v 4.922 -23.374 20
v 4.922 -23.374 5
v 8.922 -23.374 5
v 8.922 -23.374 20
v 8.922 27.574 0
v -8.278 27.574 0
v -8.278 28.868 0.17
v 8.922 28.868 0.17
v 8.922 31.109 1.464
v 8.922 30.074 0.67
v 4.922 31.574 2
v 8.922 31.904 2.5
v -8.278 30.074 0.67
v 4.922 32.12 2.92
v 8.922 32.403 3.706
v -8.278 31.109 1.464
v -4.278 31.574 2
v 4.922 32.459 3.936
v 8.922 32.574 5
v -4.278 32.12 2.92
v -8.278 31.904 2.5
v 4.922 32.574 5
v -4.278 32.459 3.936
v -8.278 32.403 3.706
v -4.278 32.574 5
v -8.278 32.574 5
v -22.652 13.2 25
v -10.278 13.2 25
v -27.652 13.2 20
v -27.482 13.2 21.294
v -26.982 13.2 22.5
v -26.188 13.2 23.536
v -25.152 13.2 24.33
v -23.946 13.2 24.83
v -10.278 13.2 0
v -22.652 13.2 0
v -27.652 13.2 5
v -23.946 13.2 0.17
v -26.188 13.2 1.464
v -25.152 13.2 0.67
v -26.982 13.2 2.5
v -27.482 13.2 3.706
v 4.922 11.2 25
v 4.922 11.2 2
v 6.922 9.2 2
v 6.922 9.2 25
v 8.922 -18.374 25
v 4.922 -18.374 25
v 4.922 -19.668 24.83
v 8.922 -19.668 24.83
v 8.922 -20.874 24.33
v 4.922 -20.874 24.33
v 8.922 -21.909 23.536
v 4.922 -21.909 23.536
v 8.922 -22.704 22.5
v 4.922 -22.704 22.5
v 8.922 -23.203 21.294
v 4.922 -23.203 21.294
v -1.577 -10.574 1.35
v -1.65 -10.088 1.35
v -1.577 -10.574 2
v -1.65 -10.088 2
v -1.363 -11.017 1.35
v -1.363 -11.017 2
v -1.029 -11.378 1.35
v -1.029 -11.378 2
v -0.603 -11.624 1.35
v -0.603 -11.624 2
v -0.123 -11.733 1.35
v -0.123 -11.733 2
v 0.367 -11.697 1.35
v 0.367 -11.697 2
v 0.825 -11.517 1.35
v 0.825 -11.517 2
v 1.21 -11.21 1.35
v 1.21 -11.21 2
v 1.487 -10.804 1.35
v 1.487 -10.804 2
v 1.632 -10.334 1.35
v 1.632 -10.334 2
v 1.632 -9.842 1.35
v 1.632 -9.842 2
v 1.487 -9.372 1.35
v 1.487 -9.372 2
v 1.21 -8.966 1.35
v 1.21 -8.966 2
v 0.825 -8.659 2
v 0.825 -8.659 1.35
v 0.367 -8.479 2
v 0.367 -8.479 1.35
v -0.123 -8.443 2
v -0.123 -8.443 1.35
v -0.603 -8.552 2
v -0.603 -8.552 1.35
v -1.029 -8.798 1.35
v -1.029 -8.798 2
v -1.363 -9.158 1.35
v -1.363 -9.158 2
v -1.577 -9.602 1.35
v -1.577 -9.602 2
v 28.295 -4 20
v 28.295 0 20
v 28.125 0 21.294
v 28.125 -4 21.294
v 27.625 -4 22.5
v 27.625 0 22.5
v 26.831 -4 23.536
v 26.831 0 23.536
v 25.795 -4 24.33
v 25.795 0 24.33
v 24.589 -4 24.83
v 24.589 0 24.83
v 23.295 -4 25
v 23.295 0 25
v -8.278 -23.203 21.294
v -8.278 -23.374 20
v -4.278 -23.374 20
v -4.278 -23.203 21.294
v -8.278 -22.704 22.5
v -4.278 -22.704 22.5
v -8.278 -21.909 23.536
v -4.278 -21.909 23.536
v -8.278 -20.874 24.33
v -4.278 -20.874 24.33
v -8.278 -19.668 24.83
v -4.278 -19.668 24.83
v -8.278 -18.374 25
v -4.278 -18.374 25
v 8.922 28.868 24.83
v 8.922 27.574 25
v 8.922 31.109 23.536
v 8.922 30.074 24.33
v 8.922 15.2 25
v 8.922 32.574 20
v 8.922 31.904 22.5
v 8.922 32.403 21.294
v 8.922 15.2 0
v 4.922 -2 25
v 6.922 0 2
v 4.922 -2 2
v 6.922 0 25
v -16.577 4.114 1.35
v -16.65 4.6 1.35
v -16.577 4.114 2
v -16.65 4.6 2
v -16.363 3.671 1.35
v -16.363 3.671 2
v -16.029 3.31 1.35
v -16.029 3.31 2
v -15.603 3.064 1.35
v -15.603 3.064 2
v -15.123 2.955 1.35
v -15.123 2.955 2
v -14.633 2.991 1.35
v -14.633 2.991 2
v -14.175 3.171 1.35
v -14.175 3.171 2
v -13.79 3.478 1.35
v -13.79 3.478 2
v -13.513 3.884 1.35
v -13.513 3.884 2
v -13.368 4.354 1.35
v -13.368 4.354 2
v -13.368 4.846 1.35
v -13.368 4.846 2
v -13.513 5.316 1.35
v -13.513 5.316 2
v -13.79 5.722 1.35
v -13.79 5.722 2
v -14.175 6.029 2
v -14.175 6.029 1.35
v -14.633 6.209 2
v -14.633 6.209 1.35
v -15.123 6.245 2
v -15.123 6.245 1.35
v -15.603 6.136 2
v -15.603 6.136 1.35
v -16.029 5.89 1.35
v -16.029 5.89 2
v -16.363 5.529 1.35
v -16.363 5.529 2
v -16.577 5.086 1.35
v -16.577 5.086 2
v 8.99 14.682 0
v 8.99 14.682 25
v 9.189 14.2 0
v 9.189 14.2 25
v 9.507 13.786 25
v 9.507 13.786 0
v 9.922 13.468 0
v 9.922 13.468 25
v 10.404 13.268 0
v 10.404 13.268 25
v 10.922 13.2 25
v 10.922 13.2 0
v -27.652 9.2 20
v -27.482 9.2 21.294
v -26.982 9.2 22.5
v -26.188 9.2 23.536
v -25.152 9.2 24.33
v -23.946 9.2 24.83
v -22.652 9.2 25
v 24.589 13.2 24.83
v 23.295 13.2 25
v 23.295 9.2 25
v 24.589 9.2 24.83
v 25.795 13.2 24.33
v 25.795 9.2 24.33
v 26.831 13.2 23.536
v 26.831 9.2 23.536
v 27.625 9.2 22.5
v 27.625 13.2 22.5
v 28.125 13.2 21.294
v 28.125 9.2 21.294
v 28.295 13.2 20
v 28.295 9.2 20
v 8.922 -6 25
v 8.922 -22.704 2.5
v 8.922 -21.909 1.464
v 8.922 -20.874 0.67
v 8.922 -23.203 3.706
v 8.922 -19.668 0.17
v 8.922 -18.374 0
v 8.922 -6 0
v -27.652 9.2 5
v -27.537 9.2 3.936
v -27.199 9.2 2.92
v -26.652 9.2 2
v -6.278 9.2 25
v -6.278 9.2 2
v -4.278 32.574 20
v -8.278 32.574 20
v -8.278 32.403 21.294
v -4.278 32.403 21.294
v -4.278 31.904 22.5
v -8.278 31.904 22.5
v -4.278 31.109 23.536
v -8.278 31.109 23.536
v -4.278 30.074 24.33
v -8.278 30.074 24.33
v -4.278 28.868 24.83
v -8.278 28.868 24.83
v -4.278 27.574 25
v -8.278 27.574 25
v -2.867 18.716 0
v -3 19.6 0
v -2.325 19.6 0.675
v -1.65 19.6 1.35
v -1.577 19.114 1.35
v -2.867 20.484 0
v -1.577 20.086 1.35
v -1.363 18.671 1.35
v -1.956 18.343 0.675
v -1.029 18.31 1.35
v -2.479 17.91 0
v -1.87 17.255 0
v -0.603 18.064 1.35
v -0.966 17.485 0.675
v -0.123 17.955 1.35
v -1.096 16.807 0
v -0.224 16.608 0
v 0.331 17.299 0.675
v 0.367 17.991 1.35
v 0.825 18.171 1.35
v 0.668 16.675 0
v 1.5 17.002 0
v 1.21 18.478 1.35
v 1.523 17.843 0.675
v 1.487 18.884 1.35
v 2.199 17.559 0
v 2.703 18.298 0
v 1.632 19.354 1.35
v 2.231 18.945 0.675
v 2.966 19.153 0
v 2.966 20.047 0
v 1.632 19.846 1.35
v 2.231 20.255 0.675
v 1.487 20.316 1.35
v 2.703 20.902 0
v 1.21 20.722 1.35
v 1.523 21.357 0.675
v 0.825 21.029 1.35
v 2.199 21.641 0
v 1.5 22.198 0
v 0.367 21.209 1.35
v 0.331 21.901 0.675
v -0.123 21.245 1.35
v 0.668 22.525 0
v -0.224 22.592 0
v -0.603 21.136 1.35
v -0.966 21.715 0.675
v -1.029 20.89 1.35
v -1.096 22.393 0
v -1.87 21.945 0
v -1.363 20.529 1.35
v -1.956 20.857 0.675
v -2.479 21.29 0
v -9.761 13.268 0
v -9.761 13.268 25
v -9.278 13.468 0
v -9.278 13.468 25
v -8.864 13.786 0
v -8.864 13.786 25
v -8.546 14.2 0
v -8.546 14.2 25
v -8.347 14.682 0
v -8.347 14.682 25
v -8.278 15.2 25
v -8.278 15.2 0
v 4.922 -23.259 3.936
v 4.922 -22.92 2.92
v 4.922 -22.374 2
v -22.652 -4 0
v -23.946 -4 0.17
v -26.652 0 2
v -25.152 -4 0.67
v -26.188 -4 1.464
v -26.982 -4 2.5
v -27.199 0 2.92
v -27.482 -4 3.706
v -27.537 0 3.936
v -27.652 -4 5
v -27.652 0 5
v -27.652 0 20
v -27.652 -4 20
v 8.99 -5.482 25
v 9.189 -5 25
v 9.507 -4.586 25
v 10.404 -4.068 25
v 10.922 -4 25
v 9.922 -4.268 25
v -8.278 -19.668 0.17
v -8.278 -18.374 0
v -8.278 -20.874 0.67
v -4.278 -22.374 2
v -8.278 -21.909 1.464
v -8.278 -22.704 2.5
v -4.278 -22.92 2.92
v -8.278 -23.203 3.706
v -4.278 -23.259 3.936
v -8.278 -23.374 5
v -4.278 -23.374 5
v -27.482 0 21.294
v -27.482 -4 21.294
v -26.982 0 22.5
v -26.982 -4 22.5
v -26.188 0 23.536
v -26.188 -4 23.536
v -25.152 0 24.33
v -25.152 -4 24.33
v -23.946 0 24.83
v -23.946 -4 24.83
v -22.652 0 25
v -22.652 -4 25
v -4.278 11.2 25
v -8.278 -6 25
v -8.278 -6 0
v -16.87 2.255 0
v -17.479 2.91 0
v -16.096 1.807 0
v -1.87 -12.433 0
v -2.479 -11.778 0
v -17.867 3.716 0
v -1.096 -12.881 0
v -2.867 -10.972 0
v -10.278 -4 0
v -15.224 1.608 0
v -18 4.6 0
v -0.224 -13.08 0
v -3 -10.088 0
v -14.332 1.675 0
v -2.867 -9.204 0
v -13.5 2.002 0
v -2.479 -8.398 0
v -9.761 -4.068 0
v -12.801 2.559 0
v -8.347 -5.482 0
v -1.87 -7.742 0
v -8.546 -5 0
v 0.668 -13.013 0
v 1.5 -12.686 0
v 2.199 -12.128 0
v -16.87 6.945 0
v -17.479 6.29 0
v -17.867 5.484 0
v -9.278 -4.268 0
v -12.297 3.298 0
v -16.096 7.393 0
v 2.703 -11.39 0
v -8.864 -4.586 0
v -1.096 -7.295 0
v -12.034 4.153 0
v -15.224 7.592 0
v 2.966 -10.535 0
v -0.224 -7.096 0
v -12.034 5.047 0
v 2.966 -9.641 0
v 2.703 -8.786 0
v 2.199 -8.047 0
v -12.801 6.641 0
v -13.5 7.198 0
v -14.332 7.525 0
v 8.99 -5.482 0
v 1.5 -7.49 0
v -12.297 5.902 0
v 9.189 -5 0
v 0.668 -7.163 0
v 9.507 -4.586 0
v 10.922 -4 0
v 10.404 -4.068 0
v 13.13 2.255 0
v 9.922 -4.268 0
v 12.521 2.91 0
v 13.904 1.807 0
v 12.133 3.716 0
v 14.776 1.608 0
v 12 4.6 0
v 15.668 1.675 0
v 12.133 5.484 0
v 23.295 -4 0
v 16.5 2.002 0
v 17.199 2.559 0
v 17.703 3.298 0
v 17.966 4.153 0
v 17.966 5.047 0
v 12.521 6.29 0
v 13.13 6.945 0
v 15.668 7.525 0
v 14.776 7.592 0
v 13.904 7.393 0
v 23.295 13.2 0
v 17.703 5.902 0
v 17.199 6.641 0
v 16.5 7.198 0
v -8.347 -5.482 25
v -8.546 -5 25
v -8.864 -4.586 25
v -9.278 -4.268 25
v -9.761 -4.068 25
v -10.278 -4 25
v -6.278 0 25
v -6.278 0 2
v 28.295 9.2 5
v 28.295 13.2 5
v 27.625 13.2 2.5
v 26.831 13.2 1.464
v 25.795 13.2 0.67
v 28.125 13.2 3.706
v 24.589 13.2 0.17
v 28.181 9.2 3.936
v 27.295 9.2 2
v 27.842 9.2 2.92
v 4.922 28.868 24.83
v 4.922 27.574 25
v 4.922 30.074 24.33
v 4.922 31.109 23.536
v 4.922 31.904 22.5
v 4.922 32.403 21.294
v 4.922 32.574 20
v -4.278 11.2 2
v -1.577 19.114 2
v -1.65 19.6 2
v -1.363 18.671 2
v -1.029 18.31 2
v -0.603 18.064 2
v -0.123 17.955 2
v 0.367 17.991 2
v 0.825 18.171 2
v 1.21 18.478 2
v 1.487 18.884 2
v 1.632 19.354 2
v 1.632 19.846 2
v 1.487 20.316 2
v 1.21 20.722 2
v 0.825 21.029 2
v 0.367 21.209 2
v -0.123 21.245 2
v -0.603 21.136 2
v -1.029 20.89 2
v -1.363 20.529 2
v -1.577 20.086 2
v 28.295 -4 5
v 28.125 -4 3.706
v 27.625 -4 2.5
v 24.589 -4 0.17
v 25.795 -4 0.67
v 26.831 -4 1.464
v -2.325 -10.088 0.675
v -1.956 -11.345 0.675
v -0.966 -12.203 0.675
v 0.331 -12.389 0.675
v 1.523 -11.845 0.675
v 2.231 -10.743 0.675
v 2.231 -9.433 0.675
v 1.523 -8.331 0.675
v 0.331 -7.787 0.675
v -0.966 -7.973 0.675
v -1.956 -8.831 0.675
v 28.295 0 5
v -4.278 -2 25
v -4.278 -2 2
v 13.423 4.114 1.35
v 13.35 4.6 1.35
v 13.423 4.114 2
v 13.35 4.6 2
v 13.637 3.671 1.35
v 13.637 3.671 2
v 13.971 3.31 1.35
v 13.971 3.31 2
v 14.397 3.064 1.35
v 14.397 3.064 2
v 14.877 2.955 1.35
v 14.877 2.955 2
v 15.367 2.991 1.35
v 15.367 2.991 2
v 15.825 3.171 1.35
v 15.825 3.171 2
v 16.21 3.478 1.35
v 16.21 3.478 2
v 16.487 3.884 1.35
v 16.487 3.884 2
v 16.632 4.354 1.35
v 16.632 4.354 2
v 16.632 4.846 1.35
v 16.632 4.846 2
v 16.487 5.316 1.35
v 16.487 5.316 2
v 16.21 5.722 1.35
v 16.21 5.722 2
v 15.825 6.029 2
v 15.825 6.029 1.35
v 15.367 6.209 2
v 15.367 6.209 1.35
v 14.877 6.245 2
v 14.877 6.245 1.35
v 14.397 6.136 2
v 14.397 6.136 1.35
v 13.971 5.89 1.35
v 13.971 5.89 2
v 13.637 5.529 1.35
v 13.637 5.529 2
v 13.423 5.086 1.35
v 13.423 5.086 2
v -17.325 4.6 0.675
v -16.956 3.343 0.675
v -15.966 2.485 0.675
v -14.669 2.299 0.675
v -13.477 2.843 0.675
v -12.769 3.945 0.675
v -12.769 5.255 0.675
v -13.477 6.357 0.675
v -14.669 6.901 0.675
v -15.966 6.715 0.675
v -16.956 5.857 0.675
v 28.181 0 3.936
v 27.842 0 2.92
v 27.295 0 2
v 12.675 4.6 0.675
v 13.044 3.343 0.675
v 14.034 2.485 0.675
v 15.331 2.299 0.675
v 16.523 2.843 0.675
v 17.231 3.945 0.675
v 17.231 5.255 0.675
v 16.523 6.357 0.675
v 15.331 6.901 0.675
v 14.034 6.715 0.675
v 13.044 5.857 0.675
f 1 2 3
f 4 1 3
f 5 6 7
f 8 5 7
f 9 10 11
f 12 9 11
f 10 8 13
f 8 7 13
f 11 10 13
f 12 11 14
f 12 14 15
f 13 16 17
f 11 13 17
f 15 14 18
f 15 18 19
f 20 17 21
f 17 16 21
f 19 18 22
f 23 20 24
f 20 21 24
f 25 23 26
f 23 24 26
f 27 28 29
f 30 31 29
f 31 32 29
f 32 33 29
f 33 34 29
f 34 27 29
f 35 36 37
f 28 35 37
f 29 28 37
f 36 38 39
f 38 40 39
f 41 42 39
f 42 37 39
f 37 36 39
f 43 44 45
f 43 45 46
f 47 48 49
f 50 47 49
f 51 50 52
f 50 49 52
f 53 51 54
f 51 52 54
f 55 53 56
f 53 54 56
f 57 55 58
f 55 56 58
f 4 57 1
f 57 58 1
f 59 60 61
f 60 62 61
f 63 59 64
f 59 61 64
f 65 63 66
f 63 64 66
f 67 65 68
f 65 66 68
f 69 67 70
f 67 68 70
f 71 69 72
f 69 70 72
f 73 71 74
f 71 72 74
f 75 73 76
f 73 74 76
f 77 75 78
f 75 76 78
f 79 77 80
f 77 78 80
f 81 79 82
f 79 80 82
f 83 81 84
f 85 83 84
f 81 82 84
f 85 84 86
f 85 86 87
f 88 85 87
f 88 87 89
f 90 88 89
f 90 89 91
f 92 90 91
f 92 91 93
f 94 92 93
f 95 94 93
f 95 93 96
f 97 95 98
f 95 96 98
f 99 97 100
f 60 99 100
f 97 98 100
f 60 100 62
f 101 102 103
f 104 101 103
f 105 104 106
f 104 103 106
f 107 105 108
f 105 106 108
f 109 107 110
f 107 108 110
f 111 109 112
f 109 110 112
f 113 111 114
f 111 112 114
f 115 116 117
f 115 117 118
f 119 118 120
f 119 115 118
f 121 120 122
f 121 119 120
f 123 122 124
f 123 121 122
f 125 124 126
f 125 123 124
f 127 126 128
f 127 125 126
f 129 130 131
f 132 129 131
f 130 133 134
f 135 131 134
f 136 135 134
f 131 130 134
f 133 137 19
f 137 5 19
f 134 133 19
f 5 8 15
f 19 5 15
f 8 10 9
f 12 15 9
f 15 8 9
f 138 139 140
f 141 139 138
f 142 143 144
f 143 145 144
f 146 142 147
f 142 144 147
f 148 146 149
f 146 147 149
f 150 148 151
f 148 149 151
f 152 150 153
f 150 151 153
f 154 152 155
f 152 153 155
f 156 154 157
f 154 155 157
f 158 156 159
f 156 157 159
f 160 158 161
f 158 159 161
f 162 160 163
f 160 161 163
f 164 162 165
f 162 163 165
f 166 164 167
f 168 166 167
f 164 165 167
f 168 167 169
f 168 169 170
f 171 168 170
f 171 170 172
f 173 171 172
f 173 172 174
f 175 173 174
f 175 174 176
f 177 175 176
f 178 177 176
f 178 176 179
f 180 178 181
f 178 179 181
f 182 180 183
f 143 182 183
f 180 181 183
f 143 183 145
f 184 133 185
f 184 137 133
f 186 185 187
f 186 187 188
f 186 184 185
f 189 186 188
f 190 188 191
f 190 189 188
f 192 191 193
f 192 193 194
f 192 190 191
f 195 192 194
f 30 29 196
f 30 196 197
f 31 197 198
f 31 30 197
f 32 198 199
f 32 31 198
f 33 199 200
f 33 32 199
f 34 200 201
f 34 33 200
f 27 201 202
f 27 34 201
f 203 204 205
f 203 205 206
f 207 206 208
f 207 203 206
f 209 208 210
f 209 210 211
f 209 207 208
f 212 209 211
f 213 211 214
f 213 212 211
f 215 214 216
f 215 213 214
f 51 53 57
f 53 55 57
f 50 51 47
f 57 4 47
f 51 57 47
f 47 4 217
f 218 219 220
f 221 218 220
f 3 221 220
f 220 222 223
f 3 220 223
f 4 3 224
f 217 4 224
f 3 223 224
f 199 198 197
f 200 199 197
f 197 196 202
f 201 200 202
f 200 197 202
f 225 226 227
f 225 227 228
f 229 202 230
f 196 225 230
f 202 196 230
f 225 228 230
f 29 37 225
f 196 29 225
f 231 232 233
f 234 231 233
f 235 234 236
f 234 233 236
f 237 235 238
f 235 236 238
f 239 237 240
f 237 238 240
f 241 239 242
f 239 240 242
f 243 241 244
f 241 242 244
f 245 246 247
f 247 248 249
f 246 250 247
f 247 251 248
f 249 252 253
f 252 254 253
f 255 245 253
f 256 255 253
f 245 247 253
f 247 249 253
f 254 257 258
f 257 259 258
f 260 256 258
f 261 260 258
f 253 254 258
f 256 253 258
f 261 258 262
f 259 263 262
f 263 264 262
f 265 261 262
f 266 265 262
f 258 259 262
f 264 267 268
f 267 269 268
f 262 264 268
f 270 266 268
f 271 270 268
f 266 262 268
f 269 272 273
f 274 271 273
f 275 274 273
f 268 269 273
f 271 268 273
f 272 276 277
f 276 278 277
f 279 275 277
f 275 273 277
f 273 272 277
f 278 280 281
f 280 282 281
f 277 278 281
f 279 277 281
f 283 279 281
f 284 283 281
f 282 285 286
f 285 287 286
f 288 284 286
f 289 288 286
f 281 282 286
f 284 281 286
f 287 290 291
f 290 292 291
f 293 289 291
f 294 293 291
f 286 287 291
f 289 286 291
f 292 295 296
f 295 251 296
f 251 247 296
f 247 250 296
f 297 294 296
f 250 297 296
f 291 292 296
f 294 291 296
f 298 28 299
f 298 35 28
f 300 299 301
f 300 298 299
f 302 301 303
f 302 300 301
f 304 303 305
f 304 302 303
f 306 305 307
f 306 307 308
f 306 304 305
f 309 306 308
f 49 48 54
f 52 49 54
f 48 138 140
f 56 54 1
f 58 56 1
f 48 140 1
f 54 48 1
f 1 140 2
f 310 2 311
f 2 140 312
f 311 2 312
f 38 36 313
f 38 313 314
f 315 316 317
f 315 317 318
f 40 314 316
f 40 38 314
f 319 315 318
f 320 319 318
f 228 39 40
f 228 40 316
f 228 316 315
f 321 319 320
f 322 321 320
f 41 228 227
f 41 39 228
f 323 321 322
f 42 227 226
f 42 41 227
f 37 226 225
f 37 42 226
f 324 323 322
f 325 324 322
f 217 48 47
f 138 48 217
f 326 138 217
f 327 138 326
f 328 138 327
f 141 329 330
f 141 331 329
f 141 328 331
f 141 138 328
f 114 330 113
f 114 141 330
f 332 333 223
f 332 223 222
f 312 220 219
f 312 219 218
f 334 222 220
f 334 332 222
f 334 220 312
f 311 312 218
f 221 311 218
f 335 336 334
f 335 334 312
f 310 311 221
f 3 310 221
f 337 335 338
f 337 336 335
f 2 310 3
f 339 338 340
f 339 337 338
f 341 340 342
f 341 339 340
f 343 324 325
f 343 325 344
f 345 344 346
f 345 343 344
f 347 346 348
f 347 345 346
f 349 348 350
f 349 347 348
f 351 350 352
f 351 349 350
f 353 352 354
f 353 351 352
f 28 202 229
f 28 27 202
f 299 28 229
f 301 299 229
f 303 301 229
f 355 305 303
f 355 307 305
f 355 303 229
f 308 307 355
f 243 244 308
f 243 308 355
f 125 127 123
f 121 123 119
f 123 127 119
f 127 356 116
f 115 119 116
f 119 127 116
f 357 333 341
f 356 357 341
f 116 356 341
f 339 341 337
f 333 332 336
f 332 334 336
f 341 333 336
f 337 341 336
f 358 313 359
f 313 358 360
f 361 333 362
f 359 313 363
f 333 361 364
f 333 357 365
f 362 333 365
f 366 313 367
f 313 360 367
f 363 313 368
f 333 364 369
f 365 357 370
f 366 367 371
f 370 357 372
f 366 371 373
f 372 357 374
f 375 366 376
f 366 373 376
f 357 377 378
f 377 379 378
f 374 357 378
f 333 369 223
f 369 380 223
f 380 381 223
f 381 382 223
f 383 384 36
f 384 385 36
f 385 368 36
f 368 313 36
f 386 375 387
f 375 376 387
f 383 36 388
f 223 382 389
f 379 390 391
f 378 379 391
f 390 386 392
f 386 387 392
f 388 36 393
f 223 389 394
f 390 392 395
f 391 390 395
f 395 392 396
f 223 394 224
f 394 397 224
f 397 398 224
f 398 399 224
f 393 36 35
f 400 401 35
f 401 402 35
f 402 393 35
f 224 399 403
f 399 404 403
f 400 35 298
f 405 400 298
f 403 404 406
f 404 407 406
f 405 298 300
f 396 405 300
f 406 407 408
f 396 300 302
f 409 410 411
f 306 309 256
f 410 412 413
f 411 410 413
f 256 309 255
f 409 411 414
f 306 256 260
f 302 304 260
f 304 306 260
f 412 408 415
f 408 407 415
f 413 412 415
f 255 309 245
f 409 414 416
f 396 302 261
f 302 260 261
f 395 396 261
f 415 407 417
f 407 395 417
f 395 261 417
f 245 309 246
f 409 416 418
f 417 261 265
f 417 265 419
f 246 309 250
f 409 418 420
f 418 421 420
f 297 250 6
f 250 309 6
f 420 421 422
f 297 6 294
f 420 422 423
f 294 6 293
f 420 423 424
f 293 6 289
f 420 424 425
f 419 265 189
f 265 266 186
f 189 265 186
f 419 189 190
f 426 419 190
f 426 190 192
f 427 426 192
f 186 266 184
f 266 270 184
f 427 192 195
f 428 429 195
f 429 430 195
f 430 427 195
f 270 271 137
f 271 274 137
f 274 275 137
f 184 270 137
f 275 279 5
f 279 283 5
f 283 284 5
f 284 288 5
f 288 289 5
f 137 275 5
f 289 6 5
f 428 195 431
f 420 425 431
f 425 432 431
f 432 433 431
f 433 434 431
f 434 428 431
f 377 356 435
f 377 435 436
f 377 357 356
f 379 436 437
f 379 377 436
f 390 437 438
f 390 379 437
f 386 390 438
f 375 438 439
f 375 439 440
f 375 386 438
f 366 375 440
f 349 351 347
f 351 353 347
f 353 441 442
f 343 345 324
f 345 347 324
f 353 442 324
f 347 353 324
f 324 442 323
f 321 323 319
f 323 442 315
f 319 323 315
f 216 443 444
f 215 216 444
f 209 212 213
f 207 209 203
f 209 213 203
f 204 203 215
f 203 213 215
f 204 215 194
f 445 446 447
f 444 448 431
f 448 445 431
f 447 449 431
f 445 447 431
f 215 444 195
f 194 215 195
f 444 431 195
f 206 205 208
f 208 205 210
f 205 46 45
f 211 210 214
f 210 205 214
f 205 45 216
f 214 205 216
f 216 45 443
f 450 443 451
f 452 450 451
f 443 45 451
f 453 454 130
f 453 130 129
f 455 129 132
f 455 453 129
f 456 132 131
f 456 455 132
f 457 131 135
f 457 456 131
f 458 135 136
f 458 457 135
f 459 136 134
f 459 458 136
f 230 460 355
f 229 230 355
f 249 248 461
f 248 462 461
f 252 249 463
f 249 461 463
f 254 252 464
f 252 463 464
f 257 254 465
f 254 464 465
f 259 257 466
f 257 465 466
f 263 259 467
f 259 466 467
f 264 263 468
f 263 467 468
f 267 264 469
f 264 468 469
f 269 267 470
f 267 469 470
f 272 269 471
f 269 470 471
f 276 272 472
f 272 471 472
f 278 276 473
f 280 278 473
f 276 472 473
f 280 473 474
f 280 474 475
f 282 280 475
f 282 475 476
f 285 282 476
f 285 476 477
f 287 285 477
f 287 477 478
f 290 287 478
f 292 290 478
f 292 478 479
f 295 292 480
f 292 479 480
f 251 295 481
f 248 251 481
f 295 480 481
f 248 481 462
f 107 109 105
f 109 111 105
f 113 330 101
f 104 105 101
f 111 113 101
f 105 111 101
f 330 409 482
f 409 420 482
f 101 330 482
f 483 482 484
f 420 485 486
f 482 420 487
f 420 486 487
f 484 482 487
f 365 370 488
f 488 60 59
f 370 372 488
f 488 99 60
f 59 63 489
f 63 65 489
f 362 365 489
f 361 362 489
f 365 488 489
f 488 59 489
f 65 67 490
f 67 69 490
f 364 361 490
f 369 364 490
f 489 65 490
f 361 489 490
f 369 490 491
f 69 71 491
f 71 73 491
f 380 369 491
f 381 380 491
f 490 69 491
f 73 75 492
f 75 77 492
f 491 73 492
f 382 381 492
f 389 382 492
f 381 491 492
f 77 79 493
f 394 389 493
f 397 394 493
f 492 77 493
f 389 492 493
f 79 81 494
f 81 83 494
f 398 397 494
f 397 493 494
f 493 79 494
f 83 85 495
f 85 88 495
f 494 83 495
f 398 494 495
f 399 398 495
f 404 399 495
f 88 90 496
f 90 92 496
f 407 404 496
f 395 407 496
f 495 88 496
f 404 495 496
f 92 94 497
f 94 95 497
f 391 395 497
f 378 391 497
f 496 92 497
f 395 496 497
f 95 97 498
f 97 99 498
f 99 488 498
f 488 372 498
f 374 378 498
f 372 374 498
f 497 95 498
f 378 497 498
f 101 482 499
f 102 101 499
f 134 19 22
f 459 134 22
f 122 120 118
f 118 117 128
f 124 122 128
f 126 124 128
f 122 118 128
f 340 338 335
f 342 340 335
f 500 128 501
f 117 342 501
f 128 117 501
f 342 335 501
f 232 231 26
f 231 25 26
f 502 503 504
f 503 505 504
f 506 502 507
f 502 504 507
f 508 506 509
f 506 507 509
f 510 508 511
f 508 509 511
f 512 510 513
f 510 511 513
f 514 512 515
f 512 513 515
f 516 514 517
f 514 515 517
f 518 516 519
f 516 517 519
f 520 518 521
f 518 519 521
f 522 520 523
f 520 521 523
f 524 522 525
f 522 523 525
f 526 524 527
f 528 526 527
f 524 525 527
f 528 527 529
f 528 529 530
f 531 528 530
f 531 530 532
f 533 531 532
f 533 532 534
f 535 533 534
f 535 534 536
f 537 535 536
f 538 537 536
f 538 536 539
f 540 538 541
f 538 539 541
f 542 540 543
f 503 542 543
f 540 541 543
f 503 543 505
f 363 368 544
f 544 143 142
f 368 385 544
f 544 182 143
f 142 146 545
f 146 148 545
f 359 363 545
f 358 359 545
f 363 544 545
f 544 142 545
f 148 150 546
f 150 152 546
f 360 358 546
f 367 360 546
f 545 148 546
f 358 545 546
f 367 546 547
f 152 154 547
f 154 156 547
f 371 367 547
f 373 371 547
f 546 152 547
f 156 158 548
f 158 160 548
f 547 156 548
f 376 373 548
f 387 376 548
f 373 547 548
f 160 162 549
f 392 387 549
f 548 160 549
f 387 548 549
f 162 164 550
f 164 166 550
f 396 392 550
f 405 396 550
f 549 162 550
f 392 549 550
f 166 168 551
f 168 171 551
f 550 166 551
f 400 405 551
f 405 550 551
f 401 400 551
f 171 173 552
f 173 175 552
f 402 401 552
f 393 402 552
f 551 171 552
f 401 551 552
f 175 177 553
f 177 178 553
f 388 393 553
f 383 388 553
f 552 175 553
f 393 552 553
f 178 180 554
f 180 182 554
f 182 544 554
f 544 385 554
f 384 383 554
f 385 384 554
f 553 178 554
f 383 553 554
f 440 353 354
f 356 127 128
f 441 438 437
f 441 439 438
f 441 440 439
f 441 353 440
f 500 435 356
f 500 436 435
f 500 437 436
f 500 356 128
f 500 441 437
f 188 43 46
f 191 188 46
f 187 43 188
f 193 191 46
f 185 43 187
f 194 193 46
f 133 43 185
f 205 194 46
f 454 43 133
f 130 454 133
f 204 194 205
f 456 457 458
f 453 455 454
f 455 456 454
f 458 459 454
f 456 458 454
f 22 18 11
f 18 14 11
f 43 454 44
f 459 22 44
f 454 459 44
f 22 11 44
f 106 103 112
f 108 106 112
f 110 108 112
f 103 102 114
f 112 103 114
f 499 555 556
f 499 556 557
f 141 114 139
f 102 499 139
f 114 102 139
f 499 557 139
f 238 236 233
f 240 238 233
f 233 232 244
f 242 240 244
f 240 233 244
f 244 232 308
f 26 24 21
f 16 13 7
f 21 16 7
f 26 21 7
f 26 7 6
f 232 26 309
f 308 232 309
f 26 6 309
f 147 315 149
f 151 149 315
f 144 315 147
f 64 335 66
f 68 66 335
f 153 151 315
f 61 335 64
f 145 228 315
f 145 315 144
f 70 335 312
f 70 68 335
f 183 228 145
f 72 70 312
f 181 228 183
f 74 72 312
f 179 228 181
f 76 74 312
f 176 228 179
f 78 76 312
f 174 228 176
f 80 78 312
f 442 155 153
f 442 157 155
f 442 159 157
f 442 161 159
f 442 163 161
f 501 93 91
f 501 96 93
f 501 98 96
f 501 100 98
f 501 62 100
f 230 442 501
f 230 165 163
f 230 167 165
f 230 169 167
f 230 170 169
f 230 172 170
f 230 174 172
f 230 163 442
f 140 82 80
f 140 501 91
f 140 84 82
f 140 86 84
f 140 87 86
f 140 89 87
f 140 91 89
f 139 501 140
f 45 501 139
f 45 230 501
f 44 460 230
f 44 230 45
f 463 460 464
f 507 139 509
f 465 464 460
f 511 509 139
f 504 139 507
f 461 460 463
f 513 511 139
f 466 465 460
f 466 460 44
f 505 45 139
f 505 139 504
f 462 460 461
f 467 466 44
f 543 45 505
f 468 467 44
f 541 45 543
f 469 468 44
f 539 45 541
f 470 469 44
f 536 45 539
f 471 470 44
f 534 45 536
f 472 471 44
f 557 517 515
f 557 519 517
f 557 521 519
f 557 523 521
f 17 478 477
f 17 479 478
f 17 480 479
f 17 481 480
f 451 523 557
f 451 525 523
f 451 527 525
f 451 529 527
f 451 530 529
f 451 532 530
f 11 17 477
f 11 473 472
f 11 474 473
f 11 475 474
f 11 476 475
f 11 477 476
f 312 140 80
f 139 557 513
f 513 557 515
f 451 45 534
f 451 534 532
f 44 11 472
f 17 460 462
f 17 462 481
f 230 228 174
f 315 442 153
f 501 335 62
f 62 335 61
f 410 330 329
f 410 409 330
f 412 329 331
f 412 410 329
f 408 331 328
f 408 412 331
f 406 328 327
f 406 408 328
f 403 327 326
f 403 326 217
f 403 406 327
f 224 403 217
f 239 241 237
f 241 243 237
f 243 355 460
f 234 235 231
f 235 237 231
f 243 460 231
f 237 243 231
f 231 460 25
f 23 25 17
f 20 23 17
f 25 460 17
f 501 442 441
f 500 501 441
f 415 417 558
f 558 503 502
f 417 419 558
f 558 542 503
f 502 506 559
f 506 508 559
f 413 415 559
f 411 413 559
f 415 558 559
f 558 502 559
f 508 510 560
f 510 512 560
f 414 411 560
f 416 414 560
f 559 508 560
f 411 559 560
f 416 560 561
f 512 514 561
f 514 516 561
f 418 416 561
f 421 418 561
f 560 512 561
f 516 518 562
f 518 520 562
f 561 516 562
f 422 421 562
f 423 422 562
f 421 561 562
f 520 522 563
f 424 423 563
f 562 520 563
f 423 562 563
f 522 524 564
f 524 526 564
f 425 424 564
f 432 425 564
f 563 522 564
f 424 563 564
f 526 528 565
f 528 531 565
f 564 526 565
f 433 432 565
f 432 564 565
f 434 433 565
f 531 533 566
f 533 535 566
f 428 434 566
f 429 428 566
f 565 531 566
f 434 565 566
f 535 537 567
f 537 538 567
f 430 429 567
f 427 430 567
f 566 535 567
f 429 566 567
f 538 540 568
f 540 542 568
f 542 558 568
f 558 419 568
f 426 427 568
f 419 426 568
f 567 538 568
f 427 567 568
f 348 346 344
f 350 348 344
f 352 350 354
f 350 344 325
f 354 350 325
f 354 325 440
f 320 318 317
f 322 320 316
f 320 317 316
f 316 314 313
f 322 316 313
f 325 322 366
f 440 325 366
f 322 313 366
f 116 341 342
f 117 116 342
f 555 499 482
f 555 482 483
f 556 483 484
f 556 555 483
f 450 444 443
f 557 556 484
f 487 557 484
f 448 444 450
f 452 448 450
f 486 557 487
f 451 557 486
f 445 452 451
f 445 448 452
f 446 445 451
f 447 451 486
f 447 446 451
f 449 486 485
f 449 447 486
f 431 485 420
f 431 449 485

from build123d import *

# Parameters (mm, degrees)
F1_DEPTH       = 2
F2_DEPTH       = 25
F3_R           = 2
F4_T1_DEPTH    = 4
F4_T3_DEPTH    = 4
F4_T5_DEPTH    = 4
F4_T7_DEPTH    = 17.2
F4_T9_DEPTH    = 17.2
F4_T11_DEPTH   = 4
F5_R           = 2
F6_SIZE        = 2
F8_D           = 3.3
F8_CSINK_D     = 6
F8_CSINK_ANGLE = 90


# Not quite as in the source:
# - a fillet or chamfer that OpenCascade refuses, or shapes differently, is made with other operations: its cross-section is extruded or revolved along the edge and cut away or added
# - a feature names something its author has since deleted; it is built from what else it names


with BuildPart() as f1:
    # F0 (on Top) → F1 (new body)
    with BuildSketch(Plane.XY):
        Polygon((28.2951036699, 0), (28.2951036699, 9.2), (4.9215265818, 9.2), (4.9215265818, 32.5735770881), (-4.2784734182, 32.5735770881), (-4.2784734182, 9.2), (-27.6520505063, 9.2), (-27.6520505063, 0), (-4.2784734182, 0), (-4.2784734182, -23.3735770881), (4.9215265818, -23.3735770881), (4.9215265818, 0), align=None)
        Polygon((4.9215265818, 9.2), (28.2951036699, 9.2), (28.2951036699, 13.2), (8.9215265818, 13.2), (8.9215265818, 32.5735770881), (4.9215265818, 32.5735770881), align=None)
        Polygon((28.2951036699, -4), (28.2951036699, 0), (4.9215265818, 0), (4.9215265818, -23.3735770881), (8.9215265818, -23.3735770881), (8.9215265818, -4), align=None)
        Polygon((-4.2784734182, 9.2), (-4.2784734182, 32.5735770881), (-8.2784734182, 32.5735770881), (-8.2784734182, 13.2), (-27.6520505063, 13.2), (-27.6520505063, 9.2), align=None)
        Polygon((-8.2784734182, -23.3735770881), (-4.2784734182, -23.3735770881), (-4.2784734182, 0), (-27.6520505063, 0), (-27.6520505063, -4), (-8.2784734182, -4), align=None)
    extrude(amount=F1_DEPTH)

    # F0 (on Top) → F2 (join)
    with BuildSketch(Plane.XY):
        Polygon((-4.2784734182, 9.2), (-4.2784734182, 32.5735770881), (-8.2784734182, 32.5735770881), (-8.2784734182, 13.2), (-27.6520505063, 13.2), (-27.6520505063, 9.2), align=None)
        Polygon((4.9215265818, 9.2), (28.2951036699, 9.2), (28.2951036699, 13.2), (8.9215265818, 13.2), (8.9215265818, 32.5735770881), (4.9215265818, 32.5735770881), align=None)
        Polygon((-8.2784734182, -23.3735770881), (-4.2784734182, -23.3735770881), (-4.2784734182, 0), (-27.6520505063, 0), (-27.6520505063, -4), (-8.2784734182, -4), align=None)
        Polygon((28.2951036699, -4), (28.2951036699, 0), (4.9215265818, 0), (4.9215265818, -23.3735770881), (8.9215265818, -23.3735770881), (8.9215265818, -4), align=None)
    extrude(amount=F2_DEPTH)

    # F3
    f3_edges = [f1.edges().sort_by_distance(p)[0] for p in [
        (8.921527, 13.2, 12.5),
        (8.921527, -4, 12.5),
    ]]
    fillet(f3_edges, radius=F3_R)

    # F4: fillet of radius 5 on 12 edges, made by hand

    # F4_s2 → F4_t1 (cut)
    with BuildSketch(Plane.XZ.offset(-13.2)):
        with BuildLine():
            ThreePointArc((23.2951036699, 25), (26.8306375758, 23.5355339059), (28.2951036699, 20))
            Line((28.2951036699, 20), (28.3951036699, 20))
            Line((28.3951036699, 20), (28.3951036699, 25.1))
            Line((28.3951036699, 25.1), (23.2951036699, 25.1))
            Line((23.2951036699, 25.1), (23.2951036699, 25))
        make_face()
        with BuildLine():
            ThreePointArc((-27.6520505063, 20), (-26.1875844123, 23.5355339059), (-22.6520505063, 25))
            Line((-22.6520505063, 25), (-22.6520505063, 25.1))
            Line((-22.6520505063, 25.1), (-27.7520505063, 25.1))
            Line((-27.7520505063, 25.1), (-27.7520505063, 20))
            Line((-27.7520505063, 20), (-27.6520505063, 20))
        make_face()
    extrude(amount=F4_T1_DEPTH, mode=Mode.SUBTRACT)

    # F4_s4 → F4_t3 (cut)
    with BuildSketch(Plane.YZ.offset(-8.2784734182)):
        with BuildLine():
            ThreePointArc((32.5735770881, 20), (31.1091109941, 23.5355339059), (27.5735770881, 25))
            Line((27.5735770881, 25), (27.5735770881, 25.1))
            Line((27.5735770881, 25.1), (32.6735770881, 25.1))
            Line((32.6735770881, 25.1), (32.6735770881, 20))
            Line((32.6735770881, 20), (32.5735770881, 20))
        make_face()
        with BuildLine():
            ThreePointArc((-23.3735770881, 20), (-21.9091109941, 23.5355339059), (-18.3735770881, 25))
            Line((-18.3735770881, 25), (-18.3735770881, 25.1))
            Line((-18.3735770881, 25.1), (-23.4735770881, 25.1))
            Line((-23.4735770881, 25.1), (-23.4735770881, 20))
            Line((-23.4735770881, 20), (-23.3735770881, 20))
        make_face()
    extrude(amount=F4_T3_DEPTH, mode=Mode.SUBTRACT)

    # F4_s6 → F4_t5 (cut)
    with BuildSketch(Plane.YZ.offset(4.9215265818)):
        with BuildLine():
            ThreePointArc((27.5735770881, 25), (31.1091109941, 23.5355339059), (32.5735770881, 20))
            Line((32.5735770881, 20), (32.6735770881, 20))
            Line((32.6735770881, 20), (32.6735770881, 25.1))
            Line((32.6735770881, 25.1), (27.5735770881, 25.1))
            Line((27.5735770881, 25.1), (27.5735770881, 25))
        make_face()
        with BuildLine():
            ThreePointArc((-18.3735770881, 25), (-21.9091109941, 23.5355339059), (-23.3735770881, 20))
            Line((-23.3735770881, 20), (-23.4735770881, 20))
            Line((-23.4735770881, 20), (-23.4735770881, 25.1))
            Line((-23.4735770881, 25.1), (-18.3735770881, 25.1))
            Line((-18.3735770881, 25.1), (-18.3735770881, 25))
        make_face()
    extrude(amount=F4_T5_DEPTH, mode=Mode.SUBTRACT)

    # F4_s8 → F4_t7 (cut)
    with BuildSketch(Plane.XZ.offset(-13.2)):
        with BuildLine():
            ThreePointArc((-22.6520505063, 0), (-26.1875844123, 1.4644660941), (-27.6520505063, 5))
            Line((-27.6520505063, 5), (-27.7520505063, 5))
            Line((-27.7520505063, 5), (-27.7520505063, -0.1))
            Line((-27.7520505063, -0.1), (-22.6520505063, -0.1))
            Line((-22.6520505063, -0.1), (-22.6520505063, 0))
        make_face()
        with BuildLine():
            ThreePointArc((28.2951036699, 5), (26.8306375758, 1.4644660941), (23.2951036699, 0))
            Line((23.2951036699, 0), (23.2951036699, -0.1))
            Line((23.2951036699, -0.1), (28.3951036699, -0.1))
            Line((28.3951036699, -0.1), (28.3951036699, 5))
            Line((28.3951036699, 5), (28.2951036699, 5))
        make_face()
    extrude(amount=F4_T7_DEPTH, mode=Mode.SUBTRACT)

    # F4_s10 → F4_t9 (cut)
    with BuildSketch(Plane.YZ.offset(-8.2784734182)):
        with BuildLine():
            ThreePointArc((27.5735770881, 0), (31.1091109941, 1.4644660941), (32.5735770881, 5))
            Line((32.5735770881, 5), (32.6735770881, 5))
            Line((32.6735770881, 5), (32.6735770881, -0.1))
            Line((32.6735770881, -0.1), (27.5735770881, -0.1))
            Line((27.5735770881, -0.1), (27.5735770881, 0))
        make_face()
        with BuildLine():
            ThreePointArc((-18.3735770881, 0), (-21.9091109941, 1.4644660941), (-23.3735770881, 5))
            Line((-23.3735770881, 5), (-23.4735770881, 5))
            Line((-23.4735770881, 5), (-23.4735770881, -0.1))
            Line((-23.4735770881, -0.1), (-18.3735770881, -0.1))
            Line((-18.3735770881, -0.1), (-18.3735770881, 0))
        make_face()
    extrude(amount=F4_T9_DEPTH, mode=Mode.SUBTRACT)

    # F4_s12 → F4_t11 (cut)
    with BuildSketch(Plane.XZ):
        with BuildLine():
            ThreePointArc((28.2951036699, 20), (26.8306375758, 23.5355339059), (23.2951036699, 25))
            Line((23.2951036699, 25), (23.2951036699, 25.1))
            Line((23.2951036699, 25.1), (28.3951036699, 25.1))
            Line((28.3951036699, 25.1), (28.3951036699, 20))
            Line((28.3951036699, 20), (28.2951036699, 20))
        make_face()
        with BuildLine():
            ThreePointArc((-27.6520505063, 20), (-26.1875844123, 23.5355339059), (-22.6520505063, 25))
            Line((-22.6520505063, 25), (-22.6520505063, 25.1))
            Line((-22.6520505063, 25.1), (-27.7520505063, 25.1))
            Line((-27.7520505063, 25.1), (-27.7520505063, 20))
            Line((-27.7520505063, 20), (-27.6520505063, 20))
        make_face()
    extrude(amount=F4_T11_DEPTH, mode=Mode.SUBTRACT)

    # F5
    f5_edges = [f1.edges().sort_by_distance(p)[0] for p in [
        (-8.278473, 13.2, 12.5),
        (-8.278473, -4, 12.5),
    ]]
    fillet(f5_edges, radius=F5_R)

    # F6
    f6_edges = [f1.edges().sort_by_distance(p)[0] for p in [
        (4.921527, 9.2, 13.5),
        (-4.278473, 9.2, 13.5),
        (4.921527, 0, 13.5),
        (-4.278473, 0, 13.5),
    ]]
    chamfer(f6_edges, length=F6_SIZE)

    # F8 (through all)
    with Locations(Plane(origin=(0, 0, 0), x_dir=(1, 0, 0), z_dir=(0, 0, -1))):
        with Locations((0, 10.087961331), (-15, -4.6), (15, -4.6), (0, -19.6)):
            CounterSinkHole(F8_D / 2, F8_CSINK_D / 2, counter_sink_angle=F8_CSINK_ANGLE)


solid = f1.part
